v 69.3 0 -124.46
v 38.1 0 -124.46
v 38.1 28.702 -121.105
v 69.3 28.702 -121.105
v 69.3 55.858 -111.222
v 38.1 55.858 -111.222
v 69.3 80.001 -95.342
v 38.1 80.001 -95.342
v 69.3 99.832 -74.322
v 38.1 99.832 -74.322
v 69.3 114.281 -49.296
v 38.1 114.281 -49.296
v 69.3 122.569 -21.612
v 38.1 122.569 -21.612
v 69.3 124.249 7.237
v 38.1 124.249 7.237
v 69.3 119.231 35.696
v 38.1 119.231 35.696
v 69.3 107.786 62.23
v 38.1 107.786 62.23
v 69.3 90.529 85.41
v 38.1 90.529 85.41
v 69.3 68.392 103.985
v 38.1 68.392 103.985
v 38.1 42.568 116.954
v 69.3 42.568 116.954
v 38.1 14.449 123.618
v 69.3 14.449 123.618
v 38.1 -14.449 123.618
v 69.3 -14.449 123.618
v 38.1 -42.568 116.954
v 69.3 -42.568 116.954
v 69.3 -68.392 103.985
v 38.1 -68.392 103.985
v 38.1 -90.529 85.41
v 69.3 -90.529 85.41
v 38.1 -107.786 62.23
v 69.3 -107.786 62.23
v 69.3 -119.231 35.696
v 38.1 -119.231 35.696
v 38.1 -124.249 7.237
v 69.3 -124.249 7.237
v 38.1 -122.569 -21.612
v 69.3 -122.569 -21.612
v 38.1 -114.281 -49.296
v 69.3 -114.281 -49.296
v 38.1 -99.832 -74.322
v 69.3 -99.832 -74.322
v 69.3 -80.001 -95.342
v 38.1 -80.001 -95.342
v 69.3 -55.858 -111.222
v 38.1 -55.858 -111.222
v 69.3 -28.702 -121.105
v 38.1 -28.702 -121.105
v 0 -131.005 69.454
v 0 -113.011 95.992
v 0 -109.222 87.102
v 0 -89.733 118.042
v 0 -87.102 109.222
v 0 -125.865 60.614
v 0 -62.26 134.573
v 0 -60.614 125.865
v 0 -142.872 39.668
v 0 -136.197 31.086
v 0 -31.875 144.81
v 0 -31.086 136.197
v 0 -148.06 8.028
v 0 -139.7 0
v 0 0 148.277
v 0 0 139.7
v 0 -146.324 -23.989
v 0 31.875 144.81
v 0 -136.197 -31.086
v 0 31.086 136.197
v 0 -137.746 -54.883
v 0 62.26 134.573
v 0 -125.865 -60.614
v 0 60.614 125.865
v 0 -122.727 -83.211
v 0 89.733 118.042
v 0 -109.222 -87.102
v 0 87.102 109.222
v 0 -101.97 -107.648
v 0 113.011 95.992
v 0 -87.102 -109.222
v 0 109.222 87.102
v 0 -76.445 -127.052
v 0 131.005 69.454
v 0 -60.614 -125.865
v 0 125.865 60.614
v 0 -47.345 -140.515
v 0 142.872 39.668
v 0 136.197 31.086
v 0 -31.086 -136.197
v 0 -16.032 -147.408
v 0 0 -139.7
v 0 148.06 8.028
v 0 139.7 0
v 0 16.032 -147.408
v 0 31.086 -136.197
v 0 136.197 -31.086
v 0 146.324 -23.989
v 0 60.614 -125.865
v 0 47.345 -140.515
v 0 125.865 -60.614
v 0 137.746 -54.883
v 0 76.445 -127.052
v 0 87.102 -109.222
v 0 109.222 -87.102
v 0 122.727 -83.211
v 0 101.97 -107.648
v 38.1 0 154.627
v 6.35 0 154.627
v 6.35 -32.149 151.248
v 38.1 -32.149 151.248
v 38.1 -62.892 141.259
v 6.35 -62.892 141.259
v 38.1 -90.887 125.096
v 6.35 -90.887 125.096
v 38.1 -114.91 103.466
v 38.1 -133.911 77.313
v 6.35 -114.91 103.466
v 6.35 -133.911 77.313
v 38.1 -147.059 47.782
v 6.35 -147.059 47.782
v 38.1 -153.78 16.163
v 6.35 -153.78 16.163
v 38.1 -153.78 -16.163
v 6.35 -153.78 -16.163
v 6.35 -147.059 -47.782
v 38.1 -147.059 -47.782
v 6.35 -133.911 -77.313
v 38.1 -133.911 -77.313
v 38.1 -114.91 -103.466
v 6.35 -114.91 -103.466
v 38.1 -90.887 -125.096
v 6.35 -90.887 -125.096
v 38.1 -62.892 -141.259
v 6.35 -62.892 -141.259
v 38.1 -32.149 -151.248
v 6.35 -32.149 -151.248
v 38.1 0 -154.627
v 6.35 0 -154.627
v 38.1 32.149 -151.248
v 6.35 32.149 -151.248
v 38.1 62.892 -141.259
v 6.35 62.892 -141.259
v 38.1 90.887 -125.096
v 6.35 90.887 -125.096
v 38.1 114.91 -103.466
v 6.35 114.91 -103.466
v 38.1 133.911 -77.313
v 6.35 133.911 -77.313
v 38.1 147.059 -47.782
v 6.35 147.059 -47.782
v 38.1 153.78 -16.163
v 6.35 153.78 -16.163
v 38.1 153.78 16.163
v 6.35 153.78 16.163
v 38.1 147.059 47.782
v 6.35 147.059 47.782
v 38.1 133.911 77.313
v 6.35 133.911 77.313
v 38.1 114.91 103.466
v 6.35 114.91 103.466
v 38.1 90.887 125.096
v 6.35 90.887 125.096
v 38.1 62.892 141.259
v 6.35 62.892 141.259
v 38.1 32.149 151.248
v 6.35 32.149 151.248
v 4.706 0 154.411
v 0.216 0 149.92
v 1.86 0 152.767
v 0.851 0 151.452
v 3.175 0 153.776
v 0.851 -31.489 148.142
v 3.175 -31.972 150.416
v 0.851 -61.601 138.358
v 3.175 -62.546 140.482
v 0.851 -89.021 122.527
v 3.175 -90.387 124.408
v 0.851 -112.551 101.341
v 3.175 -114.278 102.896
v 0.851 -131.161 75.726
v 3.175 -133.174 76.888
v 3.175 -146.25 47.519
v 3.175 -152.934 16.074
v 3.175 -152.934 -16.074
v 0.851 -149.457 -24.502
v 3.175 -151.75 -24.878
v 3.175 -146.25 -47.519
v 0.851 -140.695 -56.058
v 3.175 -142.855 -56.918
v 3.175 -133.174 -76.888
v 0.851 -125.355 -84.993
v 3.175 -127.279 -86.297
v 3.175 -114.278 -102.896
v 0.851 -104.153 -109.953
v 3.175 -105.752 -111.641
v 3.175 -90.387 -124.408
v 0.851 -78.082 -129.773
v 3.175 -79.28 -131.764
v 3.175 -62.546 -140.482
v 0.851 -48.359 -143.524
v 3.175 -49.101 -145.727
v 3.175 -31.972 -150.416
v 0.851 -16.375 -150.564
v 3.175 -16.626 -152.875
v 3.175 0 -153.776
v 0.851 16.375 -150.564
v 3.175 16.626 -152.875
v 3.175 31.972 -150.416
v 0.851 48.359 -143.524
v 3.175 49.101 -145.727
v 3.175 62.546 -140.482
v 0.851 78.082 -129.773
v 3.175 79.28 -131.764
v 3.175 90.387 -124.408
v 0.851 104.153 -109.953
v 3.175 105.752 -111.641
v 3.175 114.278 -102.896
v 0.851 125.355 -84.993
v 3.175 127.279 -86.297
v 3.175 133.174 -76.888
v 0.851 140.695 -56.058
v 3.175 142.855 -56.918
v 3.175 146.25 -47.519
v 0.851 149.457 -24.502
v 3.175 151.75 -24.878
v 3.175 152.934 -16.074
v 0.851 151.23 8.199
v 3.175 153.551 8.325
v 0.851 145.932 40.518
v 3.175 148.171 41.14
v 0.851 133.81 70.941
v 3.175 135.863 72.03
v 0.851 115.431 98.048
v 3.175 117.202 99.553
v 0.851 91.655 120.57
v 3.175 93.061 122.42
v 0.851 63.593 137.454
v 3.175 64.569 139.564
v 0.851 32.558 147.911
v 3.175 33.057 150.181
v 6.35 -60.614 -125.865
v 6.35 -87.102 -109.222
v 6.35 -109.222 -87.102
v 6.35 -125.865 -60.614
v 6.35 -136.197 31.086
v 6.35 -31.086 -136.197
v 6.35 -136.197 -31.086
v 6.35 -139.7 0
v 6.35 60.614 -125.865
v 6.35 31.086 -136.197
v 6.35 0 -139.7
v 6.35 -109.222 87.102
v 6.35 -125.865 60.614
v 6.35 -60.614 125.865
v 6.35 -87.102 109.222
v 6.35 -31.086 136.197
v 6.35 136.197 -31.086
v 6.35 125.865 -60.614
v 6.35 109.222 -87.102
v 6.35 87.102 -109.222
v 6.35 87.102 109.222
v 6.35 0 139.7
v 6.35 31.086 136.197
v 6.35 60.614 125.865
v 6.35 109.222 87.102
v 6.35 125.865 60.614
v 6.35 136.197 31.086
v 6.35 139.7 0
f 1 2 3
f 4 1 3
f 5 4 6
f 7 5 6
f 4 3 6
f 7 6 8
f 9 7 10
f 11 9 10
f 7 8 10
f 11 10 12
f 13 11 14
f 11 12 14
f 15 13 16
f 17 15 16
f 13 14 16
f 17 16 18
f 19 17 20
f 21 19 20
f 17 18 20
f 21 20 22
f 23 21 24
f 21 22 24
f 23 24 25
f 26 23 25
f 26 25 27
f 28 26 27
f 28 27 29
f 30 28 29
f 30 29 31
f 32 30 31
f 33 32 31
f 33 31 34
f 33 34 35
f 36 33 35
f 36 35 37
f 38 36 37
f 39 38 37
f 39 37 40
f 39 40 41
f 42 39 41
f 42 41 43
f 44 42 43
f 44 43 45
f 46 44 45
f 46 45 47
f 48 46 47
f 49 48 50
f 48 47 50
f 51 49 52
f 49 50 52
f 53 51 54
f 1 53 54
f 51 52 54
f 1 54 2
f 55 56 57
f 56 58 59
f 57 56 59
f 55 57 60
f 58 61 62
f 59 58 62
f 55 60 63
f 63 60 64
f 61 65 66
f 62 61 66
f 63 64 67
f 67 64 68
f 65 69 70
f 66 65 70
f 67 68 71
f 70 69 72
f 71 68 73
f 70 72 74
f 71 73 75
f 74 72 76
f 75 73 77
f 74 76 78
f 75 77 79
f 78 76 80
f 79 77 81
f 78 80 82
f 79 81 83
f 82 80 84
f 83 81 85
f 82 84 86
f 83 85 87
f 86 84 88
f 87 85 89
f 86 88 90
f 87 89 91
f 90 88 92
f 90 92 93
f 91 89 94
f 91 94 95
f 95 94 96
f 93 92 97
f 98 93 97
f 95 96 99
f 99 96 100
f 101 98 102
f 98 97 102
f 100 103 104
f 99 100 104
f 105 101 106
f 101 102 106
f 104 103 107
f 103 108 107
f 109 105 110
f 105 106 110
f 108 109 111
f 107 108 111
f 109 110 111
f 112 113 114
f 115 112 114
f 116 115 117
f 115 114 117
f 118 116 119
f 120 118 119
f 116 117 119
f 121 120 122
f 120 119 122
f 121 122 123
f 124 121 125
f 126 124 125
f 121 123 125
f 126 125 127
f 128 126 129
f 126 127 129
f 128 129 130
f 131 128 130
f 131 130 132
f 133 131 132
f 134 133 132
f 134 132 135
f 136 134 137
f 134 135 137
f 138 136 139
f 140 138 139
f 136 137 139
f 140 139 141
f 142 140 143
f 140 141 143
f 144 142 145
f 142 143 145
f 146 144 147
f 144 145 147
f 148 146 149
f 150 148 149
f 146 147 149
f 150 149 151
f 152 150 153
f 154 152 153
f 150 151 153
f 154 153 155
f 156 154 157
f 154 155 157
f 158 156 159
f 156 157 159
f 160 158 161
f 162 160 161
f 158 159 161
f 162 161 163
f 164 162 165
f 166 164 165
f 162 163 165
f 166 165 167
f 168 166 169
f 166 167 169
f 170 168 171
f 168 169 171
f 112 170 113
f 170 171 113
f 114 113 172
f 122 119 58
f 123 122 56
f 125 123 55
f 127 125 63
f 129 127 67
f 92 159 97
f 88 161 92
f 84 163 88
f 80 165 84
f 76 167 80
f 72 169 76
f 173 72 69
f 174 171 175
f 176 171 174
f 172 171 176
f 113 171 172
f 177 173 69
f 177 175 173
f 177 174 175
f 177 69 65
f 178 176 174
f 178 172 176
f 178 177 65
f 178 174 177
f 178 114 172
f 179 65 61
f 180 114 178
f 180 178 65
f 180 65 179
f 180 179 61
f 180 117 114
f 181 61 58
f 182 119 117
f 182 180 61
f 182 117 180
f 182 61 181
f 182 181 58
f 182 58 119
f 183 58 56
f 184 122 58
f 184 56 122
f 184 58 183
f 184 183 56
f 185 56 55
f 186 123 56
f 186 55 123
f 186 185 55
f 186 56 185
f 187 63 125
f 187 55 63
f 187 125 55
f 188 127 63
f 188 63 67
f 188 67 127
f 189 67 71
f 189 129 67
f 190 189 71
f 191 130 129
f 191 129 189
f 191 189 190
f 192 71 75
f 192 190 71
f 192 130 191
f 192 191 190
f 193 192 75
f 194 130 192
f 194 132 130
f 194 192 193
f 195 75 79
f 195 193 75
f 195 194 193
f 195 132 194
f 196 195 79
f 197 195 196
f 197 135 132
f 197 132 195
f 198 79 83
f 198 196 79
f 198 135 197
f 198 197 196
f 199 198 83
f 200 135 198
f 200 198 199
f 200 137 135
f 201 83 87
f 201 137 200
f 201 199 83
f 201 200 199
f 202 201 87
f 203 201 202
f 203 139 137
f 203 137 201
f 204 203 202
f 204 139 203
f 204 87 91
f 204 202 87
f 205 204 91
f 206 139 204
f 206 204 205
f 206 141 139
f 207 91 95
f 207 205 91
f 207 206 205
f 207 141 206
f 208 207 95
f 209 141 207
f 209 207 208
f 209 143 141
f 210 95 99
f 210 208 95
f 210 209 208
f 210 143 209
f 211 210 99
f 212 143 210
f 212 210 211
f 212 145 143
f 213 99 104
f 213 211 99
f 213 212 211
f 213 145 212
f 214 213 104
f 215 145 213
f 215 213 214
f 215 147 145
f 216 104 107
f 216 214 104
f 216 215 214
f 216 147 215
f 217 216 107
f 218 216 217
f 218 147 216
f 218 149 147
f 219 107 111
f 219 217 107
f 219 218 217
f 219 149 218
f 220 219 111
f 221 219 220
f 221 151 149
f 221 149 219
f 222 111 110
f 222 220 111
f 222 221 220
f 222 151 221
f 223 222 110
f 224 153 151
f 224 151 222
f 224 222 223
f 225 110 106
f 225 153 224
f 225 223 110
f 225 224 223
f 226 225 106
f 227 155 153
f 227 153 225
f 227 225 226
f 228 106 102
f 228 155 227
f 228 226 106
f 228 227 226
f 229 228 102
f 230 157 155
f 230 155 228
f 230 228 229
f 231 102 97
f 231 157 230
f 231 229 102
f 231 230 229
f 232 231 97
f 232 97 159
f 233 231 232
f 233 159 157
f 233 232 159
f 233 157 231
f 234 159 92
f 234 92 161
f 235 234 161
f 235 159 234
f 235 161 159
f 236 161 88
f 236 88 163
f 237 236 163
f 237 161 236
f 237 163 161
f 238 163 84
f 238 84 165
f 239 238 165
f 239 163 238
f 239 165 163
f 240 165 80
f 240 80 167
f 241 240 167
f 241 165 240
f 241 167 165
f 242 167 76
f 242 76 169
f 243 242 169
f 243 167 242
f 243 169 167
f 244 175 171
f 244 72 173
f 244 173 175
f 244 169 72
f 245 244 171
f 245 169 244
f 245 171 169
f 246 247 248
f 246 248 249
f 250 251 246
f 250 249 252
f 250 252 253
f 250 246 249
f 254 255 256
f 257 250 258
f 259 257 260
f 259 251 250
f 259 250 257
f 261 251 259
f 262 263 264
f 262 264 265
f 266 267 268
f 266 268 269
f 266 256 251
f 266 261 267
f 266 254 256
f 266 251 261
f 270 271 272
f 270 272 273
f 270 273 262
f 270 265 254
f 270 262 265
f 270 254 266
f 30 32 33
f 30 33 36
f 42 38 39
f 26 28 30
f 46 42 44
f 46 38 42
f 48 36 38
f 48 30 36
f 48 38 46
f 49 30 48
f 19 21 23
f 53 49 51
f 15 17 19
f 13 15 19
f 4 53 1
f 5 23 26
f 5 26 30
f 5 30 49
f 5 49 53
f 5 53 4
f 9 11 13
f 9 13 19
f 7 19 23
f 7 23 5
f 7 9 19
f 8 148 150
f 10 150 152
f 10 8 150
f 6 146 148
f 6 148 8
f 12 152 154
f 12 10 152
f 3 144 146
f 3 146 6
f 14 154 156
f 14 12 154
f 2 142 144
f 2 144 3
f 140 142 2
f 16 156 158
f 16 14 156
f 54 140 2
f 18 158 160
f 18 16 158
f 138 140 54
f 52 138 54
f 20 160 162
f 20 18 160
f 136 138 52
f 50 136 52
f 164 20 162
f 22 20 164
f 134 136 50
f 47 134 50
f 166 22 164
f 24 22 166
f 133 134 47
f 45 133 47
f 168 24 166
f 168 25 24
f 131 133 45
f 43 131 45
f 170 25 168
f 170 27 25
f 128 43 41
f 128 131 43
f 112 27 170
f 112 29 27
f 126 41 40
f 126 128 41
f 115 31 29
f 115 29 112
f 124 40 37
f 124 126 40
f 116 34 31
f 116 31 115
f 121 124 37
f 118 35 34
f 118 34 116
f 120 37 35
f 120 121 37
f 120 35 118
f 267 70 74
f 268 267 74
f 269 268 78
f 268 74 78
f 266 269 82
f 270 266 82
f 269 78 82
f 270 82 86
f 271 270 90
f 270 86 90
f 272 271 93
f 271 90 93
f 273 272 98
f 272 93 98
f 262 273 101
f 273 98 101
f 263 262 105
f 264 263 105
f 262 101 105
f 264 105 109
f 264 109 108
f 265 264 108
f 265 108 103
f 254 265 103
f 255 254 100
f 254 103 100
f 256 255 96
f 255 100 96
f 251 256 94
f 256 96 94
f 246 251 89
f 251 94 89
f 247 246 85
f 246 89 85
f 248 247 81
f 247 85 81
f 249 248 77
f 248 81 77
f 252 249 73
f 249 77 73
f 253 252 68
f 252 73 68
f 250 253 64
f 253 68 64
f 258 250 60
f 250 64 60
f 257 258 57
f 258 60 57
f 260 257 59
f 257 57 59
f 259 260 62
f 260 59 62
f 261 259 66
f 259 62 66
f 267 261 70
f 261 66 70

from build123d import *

# Parameters (mm, degrees)
SKETCH1_R           = 154.626985005
BOSS_EXTRUDE1_DEPTH = 38.1
BOSS_EXTRUDE2_START = -38.1
SKETCH2_R           = 124.46
BOSS_EXTRUDE2_DEPTH = 69.3
SKETCH3_R           = 139.7
CUT_EXTRUDE1_DEPTH  = 6.35
FILLET1_R           = 6.35


with BuildPart() as part:
    # Sketch1 → Boss-Extrude1 (new body)
    with BuildSketch(Plane(origin=(0, 0, 0), x_dir=(0, 0, -1), z_dir=(1, 0, 0))):
        with Locations(Location((0, 0, 0), (0, 0, 180))):
            Circle(SKETCH1_R)
    extrude(amount=BOSS_EXTRUDE1_DEPTH)

    # Sketch2 → Boss-Extrude2 (add)
    with BuildSketch(Plane(origin=(38.1, 0, 0), x_dir=(0, 0, -1), z_dir=(1, 0, 0)).offset(BOSS_EXTRUDE2_START)):
        Circle(SKETCH2_R)
    extrude(amount=BOSS_EXTRUDE2_DEPTH)

    # Sketch3 → Cut-Extrude1 (cut)
    with BuildSketch(Plane.ZY):
        Circle(SKETCH3_R)
    extrude(amount=-CUT_EXTRUDE1_DEPTH, mode=Mode.SUBTRACT)

    # Fillet1
    fillet1_edges = [part.edges().sort_by_distance(p)[0] for p in [
        (0, 0, -154.626985005),
    ]]
    fillet(fillet1_edges, radius=FILLET1_R)


solid = part.part
